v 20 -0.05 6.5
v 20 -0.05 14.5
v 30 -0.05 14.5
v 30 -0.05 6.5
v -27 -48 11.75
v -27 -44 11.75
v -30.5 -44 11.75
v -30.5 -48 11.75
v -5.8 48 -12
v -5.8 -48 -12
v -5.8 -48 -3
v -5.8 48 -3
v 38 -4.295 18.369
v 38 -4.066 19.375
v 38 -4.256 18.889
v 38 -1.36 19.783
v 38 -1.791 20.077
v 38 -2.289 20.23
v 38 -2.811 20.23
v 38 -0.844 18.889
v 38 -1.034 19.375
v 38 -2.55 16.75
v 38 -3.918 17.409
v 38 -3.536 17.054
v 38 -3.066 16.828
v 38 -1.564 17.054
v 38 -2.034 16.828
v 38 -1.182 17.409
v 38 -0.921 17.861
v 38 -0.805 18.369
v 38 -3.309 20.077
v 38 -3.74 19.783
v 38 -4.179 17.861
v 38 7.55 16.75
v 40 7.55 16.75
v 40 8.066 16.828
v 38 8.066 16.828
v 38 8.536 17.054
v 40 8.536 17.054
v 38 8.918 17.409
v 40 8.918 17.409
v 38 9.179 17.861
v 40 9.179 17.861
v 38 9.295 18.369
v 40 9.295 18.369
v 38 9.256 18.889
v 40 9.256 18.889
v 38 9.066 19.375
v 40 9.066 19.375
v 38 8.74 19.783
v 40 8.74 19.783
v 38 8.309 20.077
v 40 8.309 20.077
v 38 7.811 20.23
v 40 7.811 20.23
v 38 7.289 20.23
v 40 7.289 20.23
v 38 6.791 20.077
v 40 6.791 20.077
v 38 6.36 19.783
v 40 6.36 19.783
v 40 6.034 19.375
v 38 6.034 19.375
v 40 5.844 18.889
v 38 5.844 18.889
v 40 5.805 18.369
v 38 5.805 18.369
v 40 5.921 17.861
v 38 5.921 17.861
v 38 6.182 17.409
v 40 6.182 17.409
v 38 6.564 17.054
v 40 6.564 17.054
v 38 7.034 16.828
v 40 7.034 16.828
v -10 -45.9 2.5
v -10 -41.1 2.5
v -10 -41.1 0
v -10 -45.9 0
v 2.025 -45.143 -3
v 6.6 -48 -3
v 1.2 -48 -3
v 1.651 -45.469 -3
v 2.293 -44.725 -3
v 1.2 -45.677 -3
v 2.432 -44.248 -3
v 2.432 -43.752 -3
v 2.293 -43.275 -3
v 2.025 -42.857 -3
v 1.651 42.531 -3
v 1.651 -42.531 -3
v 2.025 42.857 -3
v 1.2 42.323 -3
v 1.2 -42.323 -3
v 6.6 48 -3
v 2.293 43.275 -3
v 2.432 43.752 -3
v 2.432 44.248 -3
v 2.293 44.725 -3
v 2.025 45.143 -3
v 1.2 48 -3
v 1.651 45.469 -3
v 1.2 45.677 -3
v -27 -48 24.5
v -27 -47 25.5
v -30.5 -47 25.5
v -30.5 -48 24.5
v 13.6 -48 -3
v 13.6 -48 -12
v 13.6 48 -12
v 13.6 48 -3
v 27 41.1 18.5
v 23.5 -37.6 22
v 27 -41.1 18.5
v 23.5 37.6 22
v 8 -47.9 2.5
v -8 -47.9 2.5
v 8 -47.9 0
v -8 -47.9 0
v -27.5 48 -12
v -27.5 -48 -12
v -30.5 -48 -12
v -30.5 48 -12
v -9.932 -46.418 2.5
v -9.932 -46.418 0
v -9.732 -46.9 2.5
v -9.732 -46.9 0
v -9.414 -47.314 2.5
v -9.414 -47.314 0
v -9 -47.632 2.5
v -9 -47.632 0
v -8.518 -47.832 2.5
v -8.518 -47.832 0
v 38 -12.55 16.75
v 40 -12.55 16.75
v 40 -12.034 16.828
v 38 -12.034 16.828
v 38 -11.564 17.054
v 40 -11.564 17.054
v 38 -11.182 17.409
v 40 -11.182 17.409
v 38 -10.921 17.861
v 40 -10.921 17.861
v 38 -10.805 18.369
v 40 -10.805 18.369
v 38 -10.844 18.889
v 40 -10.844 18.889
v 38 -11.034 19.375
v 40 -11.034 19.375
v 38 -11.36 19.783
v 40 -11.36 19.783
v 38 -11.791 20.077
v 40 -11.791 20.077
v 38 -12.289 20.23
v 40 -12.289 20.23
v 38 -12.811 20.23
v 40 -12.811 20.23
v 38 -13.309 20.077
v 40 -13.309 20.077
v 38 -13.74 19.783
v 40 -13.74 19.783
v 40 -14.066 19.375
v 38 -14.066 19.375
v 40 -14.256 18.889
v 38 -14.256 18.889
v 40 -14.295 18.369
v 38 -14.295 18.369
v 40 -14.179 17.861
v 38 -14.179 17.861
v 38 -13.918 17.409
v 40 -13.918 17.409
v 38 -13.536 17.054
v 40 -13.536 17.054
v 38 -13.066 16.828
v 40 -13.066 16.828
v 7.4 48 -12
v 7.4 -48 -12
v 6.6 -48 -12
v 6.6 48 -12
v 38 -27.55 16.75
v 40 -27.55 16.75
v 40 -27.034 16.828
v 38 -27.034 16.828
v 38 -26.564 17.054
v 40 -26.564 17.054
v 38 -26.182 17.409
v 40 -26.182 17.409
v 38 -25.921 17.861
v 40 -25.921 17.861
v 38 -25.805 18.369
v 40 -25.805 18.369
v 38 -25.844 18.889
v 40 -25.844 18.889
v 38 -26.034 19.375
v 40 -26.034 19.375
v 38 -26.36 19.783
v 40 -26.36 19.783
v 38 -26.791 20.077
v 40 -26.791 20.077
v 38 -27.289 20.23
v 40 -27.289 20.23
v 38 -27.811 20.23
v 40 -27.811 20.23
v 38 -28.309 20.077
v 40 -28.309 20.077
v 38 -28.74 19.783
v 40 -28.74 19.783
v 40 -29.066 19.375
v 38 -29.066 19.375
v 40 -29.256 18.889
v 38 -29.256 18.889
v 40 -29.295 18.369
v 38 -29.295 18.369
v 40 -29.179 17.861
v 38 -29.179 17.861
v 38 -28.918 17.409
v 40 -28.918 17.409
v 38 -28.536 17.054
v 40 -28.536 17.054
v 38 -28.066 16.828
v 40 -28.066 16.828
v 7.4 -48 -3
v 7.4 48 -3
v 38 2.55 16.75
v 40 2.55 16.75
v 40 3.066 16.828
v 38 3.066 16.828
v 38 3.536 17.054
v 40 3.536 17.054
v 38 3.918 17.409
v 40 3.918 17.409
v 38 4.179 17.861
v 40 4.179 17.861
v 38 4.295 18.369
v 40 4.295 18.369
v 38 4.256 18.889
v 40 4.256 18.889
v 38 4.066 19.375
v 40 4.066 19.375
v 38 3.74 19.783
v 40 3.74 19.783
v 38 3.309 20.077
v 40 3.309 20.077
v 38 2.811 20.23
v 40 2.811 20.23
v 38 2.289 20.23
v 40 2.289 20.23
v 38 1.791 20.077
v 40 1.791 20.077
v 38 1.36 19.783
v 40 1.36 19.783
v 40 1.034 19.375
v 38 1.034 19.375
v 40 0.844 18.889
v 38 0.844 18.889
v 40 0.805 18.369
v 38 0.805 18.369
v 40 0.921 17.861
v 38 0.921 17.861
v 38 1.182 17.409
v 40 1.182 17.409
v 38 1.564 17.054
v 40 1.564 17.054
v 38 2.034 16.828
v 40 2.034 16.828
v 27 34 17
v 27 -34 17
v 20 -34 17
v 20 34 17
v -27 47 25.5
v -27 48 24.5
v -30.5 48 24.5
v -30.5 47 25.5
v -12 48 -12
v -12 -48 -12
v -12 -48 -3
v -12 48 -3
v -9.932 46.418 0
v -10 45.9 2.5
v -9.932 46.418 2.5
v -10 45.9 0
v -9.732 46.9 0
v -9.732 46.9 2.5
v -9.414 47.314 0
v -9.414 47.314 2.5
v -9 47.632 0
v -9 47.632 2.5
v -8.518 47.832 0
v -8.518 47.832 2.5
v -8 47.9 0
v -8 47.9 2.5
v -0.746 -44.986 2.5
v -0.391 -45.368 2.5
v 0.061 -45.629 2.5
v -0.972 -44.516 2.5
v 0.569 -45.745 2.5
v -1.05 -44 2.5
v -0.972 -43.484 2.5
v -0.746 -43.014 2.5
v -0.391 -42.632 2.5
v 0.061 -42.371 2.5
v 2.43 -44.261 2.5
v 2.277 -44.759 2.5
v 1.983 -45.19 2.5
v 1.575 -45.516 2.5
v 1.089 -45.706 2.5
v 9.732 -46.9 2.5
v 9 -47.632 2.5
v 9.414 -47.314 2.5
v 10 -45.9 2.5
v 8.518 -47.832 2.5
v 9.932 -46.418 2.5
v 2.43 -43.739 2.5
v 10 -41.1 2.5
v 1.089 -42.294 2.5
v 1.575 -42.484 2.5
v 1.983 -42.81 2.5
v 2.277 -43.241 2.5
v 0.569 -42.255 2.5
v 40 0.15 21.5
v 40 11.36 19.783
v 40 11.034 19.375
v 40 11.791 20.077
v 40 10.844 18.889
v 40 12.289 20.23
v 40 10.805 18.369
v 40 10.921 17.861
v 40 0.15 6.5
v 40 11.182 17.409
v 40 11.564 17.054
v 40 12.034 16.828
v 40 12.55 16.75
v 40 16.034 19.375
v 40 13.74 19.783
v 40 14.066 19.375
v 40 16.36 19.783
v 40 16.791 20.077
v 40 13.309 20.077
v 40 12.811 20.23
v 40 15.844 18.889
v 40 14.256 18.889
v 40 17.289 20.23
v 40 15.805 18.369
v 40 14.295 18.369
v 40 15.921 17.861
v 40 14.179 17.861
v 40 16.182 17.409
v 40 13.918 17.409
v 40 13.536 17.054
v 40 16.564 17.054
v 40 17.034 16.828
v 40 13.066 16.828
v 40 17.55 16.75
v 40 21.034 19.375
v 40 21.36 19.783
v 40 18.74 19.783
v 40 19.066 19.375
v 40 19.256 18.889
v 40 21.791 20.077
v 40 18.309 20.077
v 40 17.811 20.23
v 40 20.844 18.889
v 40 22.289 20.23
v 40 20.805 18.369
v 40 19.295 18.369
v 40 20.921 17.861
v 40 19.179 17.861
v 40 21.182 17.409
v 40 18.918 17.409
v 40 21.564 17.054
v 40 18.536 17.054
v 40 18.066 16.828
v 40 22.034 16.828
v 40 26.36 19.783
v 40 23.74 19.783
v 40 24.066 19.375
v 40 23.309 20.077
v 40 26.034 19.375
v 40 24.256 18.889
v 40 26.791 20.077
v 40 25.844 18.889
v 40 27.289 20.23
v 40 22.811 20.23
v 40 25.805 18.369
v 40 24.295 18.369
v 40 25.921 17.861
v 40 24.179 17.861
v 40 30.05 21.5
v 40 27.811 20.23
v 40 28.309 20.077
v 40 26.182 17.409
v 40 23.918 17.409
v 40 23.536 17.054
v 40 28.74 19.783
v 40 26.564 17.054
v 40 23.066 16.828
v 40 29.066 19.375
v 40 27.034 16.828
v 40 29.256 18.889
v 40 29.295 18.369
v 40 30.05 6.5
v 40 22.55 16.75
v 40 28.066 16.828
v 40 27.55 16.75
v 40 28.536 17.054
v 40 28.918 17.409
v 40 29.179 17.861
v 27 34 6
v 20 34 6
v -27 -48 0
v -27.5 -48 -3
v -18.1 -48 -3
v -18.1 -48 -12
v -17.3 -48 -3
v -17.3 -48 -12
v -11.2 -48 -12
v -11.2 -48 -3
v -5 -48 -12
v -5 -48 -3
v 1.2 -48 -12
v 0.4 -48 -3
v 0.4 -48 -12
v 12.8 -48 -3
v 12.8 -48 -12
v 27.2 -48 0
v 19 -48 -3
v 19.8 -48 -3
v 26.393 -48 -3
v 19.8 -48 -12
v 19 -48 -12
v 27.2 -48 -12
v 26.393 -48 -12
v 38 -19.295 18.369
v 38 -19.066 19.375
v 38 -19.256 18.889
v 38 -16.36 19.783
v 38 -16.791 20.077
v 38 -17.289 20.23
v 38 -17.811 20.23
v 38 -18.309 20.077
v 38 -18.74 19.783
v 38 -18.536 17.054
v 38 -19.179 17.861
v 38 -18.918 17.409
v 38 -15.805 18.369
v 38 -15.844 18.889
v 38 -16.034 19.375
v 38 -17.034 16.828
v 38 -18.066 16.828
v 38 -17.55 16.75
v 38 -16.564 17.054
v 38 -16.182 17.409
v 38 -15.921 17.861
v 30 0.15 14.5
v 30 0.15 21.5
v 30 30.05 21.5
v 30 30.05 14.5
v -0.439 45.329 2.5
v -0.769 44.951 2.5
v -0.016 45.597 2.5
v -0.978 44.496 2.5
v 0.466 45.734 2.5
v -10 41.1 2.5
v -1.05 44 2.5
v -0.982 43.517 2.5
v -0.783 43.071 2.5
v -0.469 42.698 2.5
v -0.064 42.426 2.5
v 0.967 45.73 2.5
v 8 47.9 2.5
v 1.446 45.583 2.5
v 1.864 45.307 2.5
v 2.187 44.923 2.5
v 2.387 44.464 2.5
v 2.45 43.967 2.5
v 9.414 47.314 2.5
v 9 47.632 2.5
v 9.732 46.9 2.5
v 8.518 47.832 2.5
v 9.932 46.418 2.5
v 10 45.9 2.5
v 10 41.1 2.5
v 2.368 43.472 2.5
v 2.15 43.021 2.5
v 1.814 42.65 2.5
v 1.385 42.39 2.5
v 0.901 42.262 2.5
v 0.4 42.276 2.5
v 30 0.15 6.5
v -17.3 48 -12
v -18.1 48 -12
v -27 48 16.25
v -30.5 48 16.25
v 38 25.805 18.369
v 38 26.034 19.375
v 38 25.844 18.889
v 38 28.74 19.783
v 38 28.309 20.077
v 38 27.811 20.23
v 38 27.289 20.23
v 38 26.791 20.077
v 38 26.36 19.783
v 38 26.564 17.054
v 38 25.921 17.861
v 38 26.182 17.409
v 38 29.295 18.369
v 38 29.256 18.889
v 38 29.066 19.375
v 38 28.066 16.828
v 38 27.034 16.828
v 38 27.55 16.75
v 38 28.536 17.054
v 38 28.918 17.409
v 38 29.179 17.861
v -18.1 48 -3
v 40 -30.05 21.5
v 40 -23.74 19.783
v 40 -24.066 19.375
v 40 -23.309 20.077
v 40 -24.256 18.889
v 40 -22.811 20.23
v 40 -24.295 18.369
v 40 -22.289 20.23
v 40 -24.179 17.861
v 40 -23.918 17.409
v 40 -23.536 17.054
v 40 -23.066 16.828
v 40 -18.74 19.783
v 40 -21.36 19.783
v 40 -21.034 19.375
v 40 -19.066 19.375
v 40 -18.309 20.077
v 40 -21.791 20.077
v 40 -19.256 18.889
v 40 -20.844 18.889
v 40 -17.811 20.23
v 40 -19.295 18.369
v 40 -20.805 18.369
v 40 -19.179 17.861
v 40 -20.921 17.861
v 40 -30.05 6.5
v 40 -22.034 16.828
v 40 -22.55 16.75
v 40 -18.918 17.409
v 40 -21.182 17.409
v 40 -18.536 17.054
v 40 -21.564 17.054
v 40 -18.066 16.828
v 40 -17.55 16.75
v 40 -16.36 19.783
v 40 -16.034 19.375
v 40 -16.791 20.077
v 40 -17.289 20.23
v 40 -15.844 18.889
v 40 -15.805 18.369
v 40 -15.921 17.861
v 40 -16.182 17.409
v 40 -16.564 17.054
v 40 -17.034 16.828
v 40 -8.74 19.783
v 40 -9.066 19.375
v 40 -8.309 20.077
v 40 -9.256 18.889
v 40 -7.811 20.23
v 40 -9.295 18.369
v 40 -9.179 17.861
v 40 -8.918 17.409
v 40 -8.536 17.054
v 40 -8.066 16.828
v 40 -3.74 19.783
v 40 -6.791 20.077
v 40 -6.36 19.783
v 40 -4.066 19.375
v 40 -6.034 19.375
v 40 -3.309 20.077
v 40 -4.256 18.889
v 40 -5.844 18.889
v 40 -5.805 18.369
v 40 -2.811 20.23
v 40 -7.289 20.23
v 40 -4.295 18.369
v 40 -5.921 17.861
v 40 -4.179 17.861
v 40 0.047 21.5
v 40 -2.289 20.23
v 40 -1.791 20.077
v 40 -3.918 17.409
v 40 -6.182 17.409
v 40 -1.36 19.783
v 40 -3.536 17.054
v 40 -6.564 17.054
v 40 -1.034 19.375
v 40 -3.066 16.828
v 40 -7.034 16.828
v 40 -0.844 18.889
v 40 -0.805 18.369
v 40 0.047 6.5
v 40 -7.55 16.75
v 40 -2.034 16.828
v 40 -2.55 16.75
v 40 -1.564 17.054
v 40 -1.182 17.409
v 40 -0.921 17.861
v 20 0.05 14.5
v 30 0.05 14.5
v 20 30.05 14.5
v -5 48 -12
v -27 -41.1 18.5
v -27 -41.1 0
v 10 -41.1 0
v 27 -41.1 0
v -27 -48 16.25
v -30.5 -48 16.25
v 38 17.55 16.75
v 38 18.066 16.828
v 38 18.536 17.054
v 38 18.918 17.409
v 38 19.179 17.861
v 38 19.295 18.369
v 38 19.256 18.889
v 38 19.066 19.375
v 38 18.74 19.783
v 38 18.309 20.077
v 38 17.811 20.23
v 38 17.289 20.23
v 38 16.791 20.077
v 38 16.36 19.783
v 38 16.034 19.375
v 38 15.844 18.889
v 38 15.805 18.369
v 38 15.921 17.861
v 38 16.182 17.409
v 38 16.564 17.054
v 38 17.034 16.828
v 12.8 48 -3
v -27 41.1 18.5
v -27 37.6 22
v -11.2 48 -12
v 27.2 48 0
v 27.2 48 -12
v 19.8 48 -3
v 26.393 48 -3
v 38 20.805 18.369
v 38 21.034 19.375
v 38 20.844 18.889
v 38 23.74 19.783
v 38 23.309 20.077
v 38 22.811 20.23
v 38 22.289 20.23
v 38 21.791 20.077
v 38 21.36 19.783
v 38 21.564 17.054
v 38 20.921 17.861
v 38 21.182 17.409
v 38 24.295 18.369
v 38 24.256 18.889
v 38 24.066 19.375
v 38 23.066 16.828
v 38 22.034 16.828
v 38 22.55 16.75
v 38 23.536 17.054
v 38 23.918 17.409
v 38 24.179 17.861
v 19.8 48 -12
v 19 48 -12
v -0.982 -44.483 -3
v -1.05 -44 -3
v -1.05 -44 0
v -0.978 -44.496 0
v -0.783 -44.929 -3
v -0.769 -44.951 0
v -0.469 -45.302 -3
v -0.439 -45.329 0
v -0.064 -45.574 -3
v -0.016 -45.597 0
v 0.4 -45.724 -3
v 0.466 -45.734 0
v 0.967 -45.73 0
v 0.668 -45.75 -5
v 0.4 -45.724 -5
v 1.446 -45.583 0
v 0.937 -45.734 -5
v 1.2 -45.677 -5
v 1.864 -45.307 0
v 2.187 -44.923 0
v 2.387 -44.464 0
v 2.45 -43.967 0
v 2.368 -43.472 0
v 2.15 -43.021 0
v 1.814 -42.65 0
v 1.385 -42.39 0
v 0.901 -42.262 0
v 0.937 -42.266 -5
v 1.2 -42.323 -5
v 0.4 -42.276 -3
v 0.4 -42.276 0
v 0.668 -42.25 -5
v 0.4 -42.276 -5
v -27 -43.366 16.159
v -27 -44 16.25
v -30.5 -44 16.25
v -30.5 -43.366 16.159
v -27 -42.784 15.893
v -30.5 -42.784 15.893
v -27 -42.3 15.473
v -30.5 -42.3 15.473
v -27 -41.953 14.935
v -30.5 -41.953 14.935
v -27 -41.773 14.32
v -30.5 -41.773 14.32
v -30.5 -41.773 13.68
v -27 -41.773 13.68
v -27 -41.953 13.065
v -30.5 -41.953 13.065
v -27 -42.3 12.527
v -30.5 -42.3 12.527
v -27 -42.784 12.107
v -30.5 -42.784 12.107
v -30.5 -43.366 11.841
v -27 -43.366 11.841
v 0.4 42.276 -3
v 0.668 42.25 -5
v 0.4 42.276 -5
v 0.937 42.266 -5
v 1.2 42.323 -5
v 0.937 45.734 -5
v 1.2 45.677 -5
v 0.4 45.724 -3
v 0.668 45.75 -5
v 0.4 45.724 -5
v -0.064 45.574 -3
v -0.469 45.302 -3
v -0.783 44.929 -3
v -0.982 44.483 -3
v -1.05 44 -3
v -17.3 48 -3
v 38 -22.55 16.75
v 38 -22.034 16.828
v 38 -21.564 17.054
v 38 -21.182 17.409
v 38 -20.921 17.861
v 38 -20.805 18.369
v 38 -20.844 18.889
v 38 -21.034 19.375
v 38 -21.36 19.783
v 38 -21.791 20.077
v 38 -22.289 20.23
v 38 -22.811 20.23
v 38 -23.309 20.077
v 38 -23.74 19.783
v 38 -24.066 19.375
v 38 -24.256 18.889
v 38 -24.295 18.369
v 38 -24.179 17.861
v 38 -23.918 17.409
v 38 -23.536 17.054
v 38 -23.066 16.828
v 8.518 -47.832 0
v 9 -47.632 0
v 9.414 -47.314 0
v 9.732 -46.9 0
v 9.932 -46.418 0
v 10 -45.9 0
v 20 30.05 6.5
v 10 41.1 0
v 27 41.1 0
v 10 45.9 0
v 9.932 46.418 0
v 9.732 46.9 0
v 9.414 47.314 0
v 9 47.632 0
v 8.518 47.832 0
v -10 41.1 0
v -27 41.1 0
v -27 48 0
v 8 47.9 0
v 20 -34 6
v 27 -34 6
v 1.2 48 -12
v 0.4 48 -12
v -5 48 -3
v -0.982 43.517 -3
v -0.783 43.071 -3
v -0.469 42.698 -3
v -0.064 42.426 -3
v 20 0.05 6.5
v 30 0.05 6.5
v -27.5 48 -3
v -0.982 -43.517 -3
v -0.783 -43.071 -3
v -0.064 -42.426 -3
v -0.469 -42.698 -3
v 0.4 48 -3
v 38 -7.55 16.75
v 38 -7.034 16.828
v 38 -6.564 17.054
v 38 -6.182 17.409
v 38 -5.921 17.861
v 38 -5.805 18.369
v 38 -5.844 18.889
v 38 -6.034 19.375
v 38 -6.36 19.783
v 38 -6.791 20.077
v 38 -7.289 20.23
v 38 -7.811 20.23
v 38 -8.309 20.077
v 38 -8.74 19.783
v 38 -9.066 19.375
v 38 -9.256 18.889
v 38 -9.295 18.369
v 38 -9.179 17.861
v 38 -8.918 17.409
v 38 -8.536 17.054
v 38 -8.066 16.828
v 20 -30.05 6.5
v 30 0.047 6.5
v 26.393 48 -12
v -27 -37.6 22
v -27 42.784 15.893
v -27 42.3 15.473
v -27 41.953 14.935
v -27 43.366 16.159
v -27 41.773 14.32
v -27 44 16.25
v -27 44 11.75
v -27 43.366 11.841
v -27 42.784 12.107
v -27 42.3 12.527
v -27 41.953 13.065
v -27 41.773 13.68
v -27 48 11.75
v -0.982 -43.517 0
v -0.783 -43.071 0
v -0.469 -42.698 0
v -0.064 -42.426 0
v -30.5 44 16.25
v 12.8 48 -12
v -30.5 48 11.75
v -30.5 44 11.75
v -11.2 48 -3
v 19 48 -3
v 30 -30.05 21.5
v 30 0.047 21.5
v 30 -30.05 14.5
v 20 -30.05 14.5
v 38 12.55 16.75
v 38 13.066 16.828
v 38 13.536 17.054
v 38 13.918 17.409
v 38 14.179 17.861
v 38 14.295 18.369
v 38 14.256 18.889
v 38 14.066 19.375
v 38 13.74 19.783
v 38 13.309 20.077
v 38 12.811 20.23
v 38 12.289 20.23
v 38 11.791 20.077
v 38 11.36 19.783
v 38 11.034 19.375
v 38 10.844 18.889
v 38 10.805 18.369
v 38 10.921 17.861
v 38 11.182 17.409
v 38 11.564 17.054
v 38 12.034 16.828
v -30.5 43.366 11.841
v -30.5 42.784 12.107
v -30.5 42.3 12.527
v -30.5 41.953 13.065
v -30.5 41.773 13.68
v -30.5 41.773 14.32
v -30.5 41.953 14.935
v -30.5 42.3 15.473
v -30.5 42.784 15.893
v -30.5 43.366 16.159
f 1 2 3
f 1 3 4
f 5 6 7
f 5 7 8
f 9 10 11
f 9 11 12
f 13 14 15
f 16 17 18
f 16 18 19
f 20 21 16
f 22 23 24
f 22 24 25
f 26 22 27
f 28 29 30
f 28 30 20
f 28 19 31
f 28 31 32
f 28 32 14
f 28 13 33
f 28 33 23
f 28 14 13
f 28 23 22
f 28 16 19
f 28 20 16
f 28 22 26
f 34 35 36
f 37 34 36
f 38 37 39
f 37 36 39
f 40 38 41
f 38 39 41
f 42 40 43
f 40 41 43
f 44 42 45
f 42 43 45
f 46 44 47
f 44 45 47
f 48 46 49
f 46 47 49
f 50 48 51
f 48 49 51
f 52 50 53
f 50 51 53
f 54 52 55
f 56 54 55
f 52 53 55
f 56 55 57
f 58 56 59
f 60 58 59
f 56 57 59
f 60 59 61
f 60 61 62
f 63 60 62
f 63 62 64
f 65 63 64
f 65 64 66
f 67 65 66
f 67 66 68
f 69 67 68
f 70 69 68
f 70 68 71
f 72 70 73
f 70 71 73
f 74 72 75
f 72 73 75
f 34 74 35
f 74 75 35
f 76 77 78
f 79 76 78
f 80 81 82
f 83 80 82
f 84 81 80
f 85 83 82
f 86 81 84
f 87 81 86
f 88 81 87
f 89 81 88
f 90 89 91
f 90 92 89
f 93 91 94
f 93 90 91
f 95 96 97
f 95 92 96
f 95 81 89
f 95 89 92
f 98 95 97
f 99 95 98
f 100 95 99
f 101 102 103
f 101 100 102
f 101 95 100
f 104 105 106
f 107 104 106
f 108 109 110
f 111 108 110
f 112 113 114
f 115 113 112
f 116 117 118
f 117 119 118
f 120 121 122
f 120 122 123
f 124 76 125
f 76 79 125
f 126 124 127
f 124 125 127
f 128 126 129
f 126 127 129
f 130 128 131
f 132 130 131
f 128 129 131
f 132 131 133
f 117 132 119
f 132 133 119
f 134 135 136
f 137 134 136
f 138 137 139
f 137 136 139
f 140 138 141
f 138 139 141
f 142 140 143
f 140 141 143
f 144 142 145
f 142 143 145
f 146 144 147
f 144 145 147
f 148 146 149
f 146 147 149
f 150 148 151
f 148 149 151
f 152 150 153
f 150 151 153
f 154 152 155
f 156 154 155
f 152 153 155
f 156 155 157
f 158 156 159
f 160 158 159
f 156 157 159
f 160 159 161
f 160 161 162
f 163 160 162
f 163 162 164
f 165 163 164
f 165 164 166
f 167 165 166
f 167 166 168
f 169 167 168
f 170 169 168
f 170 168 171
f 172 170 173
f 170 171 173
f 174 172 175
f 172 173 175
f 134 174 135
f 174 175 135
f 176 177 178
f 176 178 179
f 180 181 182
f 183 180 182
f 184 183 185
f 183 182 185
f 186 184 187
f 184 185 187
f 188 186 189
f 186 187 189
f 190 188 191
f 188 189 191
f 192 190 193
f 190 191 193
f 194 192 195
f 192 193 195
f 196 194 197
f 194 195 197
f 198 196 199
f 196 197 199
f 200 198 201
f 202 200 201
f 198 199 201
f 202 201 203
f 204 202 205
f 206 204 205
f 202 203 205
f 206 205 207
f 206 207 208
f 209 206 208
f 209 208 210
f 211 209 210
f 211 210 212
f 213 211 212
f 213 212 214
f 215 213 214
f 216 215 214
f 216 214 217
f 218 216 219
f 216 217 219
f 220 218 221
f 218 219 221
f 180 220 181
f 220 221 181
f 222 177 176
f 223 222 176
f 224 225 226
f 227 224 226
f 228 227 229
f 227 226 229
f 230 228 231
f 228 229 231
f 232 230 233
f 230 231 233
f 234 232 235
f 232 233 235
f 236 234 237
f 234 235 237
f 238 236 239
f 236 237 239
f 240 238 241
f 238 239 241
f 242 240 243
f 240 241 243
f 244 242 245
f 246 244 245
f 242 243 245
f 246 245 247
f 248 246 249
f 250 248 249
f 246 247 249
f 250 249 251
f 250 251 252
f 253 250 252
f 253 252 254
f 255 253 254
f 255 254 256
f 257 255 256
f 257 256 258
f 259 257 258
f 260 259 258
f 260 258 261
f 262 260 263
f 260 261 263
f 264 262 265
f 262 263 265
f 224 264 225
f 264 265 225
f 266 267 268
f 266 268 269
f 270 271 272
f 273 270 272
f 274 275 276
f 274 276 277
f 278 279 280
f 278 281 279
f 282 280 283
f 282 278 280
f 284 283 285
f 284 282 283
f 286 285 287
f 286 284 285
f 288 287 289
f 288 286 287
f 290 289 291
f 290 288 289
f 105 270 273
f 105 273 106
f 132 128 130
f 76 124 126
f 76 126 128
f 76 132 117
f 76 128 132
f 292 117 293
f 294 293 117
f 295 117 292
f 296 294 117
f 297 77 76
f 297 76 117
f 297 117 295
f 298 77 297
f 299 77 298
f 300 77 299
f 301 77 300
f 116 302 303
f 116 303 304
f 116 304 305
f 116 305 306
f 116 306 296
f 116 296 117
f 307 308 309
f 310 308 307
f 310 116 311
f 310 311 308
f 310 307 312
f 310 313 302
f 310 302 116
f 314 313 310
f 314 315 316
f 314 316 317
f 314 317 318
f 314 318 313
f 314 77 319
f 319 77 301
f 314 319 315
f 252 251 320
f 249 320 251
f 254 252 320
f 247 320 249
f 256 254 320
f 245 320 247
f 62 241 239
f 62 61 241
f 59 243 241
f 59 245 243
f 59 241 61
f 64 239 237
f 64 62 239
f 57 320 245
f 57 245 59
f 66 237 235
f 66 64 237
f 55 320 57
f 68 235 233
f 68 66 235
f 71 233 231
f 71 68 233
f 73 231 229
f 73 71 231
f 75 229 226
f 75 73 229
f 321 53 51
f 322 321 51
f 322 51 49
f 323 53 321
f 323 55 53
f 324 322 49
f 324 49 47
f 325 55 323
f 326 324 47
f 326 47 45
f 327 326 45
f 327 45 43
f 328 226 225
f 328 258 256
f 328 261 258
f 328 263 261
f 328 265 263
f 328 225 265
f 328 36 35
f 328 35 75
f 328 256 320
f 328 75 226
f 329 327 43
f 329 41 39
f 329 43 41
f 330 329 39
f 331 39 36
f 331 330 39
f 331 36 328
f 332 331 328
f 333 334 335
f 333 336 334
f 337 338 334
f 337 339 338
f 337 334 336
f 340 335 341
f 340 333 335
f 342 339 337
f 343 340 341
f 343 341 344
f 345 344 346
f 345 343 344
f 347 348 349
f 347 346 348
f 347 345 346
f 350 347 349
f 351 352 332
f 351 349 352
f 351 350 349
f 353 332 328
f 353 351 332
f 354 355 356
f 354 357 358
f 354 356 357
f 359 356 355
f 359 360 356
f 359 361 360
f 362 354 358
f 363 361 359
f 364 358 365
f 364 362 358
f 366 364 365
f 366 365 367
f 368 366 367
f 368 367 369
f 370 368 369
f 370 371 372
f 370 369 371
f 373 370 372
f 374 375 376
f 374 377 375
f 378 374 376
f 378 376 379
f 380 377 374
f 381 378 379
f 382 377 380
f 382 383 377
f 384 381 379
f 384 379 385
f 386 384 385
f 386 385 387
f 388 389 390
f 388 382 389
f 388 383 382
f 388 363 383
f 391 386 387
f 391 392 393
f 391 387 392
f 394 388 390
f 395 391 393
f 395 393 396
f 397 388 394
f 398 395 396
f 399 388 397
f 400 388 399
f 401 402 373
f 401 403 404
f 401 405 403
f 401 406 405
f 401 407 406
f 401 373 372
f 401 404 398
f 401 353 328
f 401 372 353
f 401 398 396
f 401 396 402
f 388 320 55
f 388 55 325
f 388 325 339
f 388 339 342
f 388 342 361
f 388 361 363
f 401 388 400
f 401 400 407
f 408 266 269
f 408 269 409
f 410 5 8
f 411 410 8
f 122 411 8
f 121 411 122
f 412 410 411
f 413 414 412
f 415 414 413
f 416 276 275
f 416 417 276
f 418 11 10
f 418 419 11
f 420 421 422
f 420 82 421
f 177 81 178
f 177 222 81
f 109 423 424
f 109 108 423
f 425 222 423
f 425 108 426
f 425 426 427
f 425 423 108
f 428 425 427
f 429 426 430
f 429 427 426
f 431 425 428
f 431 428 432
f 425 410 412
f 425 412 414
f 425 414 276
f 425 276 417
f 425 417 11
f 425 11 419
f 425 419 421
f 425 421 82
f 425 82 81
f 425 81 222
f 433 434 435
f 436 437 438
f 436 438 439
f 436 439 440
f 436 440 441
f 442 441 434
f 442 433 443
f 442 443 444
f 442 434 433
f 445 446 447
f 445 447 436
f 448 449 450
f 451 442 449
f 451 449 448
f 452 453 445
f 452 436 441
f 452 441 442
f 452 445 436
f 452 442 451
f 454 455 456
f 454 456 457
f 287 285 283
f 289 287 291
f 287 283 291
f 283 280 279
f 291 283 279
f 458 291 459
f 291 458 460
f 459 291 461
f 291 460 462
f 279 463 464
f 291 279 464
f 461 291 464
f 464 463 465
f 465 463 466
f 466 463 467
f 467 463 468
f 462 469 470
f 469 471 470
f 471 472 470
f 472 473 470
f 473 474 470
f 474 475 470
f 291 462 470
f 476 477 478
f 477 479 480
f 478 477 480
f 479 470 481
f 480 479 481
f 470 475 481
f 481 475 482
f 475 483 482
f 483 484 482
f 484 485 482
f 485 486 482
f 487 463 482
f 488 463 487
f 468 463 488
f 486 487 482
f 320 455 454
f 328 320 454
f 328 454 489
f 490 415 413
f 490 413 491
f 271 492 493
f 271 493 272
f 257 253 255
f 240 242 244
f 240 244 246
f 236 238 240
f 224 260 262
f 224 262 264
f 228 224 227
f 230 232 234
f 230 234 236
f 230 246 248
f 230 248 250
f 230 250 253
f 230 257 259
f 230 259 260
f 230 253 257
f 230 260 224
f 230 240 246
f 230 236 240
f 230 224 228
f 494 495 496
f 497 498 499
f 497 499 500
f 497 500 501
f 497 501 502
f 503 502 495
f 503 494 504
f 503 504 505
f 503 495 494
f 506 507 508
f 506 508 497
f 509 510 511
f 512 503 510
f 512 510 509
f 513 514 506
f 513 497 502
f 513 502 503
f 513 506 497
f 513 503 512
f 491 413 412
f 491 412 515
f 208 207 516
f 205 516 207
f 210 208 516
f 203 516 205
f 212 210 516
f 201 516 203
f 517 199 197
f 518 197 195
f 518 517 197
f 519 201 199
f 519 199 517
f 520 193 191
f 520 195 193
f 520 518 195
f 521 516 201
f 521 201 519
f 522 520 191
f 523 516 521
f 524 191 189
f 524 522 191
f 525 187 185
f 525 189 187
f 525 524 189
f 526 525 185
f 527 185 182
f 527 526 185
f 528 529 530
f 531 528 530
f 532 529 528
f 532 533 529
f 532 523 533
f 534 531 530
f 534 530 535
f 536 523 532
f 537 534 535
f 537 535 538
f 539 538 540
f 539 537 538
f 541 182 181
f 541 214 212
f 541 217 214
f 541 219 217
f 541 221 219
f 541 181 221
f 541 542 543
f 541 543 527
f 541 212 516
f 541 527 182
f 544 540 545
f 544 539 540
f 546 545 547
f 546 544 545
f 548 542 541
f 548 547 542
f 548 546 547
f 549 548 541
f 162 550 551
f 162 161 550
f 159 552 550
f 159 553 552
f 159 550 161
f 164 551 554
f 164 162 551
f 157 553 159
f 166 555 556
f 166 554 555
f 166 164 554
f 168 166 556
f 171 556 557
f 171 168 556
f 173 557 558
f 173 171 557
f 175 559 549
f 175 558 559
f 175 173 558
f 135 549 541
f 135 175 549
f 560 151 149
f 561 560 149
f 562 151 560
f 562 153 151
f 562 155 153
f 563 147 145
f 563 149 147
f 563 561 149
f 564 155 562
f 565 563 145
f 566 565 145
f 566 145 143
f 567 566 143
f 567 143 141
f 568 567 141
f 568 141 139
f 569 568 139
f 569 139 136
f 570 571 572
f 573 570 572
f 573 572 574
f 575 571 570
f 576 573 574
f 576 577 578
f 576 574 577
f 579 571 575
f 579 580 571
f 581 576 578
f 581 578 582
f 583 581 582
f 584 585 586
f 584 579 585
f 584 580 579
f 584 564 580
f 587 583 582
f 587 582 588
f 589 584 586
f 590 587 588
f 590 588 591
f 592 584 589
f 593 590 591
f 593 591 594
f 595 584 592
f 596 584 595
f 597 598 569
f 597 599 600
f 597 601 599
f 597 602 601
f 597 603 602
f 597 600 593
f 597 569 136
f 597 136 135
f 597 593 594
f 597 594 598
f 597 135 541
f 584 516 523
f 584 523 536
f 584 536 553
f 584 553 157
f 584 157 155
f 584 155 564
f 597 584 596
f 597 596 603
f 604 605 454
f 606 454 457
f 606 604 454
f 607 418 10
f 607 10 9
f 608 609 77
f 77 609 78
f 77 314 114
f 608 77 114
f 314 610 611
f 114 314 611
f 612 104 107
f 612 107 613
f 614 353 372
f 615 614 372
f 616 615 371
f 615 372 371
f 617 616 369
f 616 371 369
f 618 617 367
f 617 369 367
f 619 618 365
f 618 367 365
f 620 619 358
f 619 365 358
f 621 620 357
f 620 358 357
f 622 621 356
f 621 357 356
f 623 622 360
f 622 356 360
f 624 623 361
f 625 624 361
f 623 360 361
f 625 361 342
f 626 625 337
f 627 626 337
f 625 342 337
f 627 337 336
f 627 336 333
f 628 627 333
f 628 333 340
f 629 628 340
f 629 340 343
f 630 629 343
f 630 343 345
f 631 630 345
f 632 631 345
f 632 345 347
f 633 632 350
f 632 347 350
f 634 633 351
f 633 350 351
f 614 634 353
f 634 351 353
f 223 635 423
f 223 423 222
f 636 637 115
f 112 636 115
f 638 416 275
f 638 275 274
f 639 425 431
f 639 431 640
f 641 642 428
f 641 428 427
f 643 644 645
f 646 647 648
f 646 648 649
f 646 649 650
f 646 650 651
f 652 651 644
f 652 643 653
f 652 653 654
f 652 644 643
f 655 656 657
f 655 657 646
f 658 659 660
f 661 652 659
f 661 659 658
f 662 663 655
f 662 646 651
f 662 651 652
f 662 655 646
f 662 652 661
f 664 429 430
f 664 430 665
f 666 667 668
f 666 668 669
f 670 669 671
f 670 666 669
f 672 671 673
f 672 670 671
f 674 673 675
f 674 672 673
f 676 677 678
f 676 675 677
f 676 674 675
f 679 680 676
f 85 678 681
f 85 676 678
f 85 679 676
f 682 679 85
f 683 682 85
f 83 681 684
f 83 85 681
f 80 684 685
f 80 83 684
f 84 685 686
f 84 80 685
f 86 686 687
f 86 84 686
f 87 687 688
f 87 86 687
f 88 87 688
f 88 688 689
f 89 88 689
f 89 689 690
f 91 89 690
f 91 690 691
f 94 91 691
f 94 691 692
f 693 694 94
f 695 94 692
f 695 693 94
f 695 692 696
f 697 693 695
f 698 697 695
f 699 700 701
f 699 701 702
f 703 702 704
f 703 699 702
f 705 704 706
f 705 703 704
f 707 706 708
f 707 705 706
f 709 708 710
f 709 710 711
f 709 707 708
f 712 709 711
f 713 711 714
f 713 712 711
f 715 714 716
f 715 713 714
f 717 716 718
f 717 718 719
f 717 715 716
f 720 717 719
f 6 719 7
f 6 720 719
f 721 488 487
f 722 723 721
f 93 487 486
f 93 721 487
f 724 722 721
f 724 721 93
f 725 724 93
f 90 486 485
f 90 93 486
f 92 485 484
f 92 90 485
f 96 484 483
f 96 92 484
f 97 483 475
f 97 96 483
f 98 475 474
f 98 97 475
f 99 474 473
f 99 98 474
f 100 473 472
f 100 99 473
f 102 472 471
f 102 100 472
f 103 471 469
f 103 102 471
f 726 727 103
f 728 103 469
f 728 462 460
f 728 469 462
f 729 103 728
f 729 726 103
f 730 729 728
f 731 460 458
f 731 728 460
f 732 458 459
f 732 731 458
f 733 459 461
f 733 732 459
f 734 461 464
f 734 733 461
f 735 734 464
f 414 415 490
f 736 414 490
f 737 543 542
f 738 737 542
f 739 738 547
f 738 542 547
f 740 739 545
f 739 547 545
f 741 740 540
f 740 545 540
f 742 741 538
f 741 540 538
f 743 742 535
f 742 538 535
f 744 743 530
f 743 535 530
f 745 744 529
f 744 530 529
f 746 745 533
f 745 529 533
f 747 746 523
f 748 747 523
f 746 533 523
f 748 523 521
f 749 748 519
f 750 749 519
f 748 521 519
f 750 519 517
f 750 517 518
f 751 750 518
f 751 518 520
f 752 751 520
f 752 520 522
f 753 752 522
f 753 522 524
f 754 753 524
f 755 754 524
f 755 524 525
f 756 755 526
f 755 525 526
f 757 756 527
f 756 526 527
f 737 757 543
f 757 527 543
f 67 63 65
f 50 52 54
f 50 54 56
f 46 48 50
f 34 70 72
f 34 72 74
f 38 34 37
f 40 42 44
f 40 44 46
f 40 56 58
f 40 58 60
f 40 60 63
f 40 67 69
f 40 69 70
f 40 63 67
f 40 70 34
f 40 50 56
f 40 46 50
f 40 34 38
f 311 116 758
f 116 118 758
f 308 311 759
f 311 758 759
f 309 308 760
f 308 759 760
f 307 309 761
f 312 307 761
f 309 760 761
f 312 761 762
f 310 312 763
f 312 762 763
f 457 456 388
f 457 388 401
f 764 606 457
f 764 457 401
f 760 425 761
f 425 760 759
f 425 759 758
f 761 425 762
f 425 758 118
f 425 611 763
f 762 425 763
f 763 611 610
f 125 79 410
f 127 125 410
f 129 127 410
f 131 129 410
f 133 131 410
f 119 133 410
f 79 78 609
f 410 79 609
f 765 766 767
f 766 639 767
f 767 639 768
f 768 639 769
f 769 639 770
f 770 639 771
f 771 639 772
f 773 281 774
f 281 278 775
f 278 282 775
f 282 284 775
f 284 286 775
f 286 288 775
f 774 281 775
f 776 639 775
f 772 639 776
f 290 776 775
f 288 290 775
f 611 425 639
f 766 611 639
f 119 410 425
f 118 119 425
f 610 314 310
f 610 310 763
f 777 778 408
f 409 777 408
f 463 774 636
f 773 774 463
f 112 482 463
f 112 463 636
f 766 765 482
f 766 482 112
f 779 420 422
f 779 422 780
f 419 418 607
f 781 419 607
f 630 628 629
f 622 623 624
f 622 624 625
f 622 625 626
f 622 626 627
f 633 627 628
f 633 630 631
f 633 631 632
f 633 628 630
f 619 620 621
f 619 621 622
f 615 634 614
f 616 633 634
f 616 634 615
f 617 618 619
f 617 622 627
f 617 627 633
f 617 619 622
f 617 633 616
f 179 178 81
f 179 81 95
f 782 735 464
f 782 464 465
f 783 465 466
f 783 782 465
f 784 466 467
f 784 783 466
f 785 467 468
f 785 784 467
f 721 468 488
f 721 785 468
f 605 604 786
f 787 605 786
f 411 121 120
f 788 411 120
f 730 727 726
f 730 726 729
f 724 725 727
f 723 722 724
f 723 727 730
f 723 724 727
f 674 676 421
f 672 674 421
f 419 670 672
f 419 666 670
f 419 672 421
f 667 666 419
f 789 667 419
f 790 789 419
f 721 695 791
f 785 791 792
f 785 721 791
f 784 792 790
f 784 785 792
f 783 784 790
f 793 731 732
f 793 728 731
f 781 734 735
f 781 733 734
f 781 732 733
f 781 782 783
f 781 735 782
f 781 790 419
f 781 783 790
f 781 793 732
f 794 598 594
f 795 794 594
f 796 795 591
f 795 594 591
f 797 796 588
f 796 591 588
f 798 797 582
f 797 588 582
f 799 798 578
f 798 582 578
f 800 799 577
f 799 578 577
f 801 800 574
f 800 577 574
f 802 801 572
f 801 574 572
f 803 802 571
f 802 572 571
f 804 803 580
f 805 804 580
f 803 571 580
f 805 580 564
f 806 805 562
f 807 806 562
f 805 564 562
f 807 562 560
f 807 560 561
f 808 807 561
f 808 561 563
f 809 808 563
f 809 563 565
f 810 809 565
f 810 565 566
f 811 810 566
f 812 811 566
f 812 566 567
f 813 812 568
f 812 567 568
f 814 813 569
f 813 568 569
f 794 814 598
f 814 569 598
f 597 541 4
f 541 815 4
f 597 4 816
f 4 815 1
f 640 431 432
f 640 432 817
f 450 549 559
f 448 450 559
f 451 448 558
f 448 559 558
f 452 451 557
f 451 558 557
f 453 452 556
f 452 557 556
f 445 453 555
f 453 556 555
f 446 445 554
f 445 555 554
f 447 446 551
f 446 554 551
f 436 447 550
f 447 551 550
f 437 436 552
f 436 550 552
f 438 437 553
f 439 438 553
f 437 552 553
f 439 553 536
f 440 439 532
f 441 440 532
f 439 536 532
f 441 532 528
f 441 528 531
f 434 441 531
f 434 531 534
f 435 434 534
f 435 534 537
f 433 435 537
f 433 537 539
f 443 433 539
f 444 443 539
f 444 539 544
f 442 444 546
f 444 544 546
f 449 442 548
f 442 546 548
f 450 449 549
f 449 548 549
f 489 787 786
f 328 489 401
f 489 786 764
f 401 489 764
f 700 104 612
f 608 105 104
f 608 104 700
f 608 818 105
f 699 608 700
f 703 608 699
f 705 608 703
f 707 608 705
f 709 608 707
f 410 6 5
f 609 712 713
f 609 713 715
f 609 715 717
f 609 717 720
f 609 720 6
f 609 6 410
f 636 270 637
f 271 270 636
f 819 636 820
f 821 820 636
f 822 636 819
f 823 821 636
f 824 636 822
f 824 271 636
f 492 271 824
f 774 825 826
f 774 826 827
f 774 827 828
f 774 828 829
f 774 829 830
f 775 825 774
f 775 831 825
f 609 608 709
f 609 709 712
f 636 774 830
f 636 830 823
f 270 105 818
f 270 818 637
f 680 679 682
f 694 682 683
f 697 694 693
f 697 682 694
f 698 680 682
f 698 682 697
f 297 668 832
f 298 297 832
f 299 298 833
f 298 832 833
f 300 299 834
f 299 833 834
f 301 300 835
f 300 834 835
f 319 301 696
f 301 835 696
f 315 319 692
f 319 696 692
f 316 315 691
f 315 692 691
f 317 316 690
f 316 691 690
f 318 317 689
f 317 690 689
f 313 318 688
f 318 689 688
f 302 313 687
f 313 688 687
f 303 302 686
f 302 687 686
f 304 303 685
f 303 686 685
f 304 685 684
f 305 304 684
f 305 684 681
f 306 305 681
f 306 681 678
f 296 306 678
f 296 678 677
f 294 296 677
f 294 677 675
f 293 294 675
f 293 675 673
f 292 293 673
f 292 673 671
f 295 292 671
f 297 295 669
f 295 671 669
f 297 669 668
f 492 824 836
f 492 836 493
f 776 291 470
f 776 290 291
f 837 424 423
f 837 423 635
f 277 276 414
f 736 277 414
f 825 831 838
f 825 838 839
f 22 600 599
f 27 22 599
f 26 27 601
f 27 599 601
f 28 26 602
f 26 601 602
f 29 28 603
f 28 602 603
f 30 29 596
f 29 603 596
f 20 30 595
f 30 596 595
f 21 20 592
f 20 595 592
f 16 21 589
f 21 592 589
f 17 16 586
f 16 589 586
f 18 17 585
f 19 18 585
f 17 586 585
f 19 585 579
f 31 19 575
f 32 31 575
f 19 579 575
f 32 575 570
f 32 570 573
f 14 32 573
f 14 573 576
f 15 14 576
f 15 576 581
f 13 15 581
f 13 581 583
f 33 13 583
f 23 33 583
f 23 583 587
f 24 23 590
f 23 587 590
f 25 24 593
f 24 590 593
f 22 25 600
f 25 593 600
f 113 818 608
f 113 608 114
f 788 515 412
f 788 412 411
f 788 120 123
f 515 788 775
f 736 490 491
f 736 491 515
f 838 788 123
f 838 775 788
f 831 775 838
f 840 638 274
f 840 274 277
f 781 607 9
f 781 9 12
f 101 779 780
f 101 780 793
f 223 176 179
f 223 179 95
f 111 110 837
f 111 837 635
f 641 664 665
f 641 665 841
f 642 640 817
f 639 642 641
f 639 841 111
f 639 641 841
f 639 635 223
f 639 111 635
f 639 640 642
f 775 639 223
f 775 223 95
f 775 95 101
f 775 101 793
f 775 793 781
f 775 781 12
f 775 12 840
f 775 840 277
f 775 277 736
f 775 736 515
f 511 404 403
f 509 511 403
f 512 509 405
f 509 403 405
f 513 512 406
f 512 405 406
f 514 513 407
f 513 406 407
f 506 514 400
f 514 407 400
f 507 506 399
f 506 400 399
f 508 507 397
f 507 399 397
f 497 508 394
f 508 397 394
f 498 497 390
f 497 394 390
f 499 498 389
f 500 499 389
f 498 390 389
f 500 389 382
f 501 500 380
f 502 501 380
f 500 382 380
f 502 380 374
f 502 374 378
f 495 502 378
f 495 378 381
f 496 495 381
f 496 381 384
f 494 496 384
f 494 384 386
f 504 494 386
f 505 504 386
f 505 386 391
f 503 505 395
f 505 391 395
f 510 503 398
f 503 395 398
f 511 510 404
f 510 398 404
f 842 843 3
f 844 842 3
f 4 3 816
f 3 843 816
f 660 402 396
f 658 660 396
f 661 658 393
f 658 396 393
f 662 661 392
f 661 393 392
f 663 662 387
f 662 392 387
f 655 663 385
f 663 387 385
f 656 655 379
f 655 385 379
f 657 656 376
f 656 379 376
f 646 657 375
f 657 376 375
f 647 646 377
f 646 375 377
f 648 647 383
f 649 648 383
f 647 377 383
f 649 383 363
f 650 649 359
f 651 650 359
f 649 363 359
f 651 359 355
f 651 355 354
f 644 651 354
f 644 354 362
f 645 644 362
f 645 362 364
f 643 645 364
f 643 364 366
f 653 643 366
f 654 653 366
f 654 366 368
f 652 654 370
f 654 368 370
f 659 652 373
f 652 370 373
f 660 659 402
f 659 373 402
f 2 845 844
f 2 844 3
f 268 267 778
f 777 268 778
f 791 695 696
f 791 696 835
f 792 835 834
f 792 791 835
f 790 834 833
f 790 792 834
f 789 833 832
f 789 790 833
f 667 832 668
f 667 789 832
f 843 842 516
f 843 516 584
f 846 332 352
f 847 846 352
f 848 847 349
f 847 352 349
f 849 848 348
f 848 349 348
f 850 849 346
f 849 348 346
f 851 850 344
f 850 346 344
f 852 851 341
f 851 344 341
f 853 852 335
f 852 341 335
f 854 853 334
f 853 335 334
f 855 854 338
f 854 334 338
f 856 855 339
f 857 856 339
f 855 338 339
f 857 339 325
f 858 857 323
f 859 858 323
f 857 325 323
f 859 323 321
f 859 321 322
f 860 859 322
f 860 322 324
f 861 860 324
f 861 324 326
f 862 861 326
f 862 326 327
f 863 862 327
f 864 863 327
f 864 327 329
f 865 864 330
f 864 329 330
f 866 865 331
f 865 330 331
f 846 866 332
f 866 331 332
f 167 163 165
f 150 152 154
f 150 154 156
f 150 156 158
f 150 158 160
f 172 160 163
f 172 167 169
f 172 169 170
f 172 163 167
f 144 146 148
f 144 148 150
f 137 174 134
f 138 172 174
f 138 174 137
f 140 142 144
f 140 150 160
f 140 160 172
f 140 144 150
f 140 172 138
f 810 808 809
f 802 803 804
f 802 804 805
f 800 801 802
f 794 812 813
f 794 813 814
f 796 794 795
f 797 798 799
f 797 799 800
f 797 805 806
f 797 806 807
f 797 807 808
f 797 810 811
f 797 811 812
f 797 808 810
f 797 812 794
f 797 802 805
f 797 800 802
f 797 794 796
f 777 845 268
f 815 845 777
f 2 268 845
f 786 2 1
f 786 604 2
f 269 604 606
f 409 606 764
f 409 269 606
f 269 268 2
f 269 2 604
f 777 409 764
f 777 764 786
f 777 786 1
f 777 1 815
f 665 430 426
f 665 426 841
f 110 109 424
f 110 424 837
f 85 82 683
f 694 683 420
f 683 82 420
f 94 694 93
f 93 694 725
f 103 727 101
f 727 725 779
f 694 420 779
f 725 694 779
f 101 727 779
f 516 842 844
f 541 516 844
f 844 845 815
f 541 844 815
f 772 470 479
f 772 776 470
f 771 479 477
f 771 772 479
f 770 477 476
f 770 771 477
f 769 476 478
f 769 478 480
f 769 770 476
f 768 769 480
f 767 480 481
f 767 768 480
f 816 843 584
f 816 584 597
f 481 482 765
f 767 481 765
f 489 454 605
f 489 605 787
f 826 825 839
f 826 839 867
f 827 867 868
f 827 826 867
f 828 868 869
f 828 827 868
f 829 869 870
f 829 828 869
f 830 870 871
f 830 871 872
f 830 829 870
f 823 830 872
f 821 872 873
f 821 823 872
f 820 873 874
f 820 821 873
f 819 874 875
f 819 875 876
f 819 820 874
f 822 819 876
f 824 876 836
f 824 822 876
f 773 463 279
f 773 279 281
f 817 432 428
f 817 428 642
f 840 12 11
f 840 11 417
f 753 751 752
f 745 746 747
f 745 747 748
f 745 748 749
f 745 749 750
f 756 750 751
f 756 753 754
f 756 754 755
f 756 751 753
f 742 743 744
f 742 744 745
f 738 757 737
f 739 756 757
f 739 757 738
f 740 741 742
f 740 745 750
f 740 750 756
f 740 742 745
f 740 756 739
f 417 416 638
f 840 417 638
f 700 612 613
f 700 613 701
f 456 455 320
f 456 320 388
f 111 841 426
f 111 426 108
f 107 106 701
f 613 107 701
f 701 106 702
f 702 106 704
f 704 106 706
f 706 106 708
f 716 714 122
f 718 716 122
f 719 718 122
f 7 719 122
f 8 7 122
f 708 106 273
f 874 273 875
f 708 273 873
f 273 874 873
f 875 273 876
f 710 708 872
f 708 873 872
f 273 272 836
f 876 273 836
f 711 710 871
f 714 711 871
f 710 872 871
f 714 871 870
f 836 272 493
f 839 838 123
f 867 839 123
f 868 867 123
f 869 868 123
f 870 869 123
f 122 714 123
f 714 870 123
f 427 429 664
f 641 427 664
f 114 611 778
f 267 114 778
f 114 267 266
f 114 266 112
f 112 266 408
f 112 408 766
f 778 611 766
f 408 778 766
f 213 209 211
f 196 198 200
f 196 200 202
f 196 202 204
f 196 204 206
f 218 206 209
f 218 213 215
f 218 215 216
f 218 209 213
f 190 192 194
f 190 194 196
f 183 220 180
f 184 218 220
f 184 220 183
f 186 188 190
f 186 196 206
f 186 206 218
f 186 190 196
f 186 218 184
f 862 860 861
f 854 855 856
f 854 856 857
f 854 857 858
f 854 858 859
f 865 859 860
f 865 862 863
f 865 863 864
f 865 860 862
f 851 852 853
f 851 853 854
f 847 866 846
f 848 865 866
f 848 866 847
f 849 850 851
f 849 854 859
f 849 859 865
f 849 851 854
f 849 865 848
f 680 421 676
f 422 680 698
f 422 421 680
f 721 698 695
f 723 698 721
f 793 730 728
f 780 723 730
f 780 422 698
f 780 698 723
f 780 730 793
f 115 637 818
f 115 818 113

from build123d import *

# Parameters (mm, degrees)
SKETCH_1_W             = 54
SKETCH_1_H             = 82.2
EXTRUDE_1_DEPTH        = 22
CHAMFER_1_SIZE         = 3.5
SKETCH_2_W             = 54.2
SKETCH_2_H             = 96
EXTRUDE_2_DEPTH        = 12
EXTRUDE_3_DEPTH        = 3.5
CHAMFER_2_SIZE         = 1
SKETCH_5_W             = 9.4
SKETCH_5_H             = 96
SKETCH_5_W_2           = 5.3
SKETCH_5_W_3           = 5.4
SKETCH_5_W_4           = 6.593289258
CUT_EXTRUDE_2_DEPTH    = 9
SKETCH_6_W             = 11
SKETCH_6_H             = 68
CUT_EXTRUDE_3_DEPTH    = 7
SKETCH_7_W             = 8
SKETCH_7_H             = 30
EXTRUDE_5_DEPTH        = 10
SKETCH_8_W             = 15
SKETCH_8_H             = 30.09688029
SKETCH_8_H_2           = 29.900272582
EXTRUDE_6_DEPTH        = 10
SKETCH_9_R             = 1.75
CUT_EXTRUDE_4_DEPTH    = 2
SKETCH_10_W            = 20
SKETCH_10_H            = 2.5
EXTRUDE_7_DEPTH        = 6.8
CUT_EXTRUDE_START      = -5
SKETCH_4_R             = 1.75
CUT_EXTRUDE_1_DEPTH    = 75.485183559
FILLET_1_R             = 2
FILLET_1_OF_MIRROR_1_R = 2


with BuildPart() as part:
    # Эскиз1 → Бобышка-Вытянуть1 (new body)
    with BuildSketch(Plane.XY):
        Rectangle(SKETCH_1_W, SKETCH_1_H)
    extrude(amount=EXTRUDE_1_DEPTH)

    # Фаска1
    chamfer_1_edges = [part.edges().sort_by_distance(p)[0] for p in [
        (0, -41.1, 22),
        (27, 0, 22),
        (0, 41.1, 22),
    ]]
    chamfer(chamfer_1_edges, length=CHAMFER_1_SIZE)

    # Эскиз2 → Бобышка-Вытянуть2 (add)
    with BuildSketch(Plane(origin=(0, 0, 0), x_dir=(-1, 0, 0), z_dir=(0, 0, -1))):
        with Locations((-0.1, 0)):
            Rectangle(SKETCH_2_W, SKETCH_2_H)
    extrude(amount=EXTRUDE_2_DEPTH)

    # Эскиз3 → Бобышка-Вытянуть3 (add)
    with BuildSketch(Plane.ZY.offset(27)):
        with BuildLine():
            Line((-12, 48), (11.75, 48))
            Line((11.75, 48), (11.75, 44))
            ThreePointArc((11.75, 44), (14, 41.75), (16.25, 44))
            Line((16.25, 44), (16.25, 48))
            Line((16.25, 48), (25.5, 48))
            Line((25.5, 48), (25.5, -48))
            Line((25.5, -48), (16.25, -48))
            Line((16.25, -48), (16.25, -44))
            ThreePointArc((16.25, -44), (14, -41.75), (11.75, -44))
            Line((11.75, -44), (11.75, -48))
            Line((11.75, -48), (-12, -48))
            Line((-12, -48), (-12, 48))
        make_face()
    extrude(amount=EXTRUDE_3_DEPTH)

    # Фаска2
    chamfer_2_edges = [part.edges().sort_by_distance(p)[0] for p in [
        (-28.75, -48, 25.5),
        (-28.75, 48, 25.5),
    ]]
    chamfer(chamfer_2_edges, length=CHAMFER_2_SIZE)

    # Эскиз5 → Вырез-Вытянуть2 (cut)
    with BuildSketch(Plane(origin=(0, 0, -12), x_dir=(-1, 0, 0), z_dir=(0, 0, -1))):
        with Locations((22.8, 0)):
            Rectangle(SKETCH_5_W, SKETCH_5_H)
        with Locations((14.65, 0)):
            Rectangle(SKETCH_5_W_2, SKETCH_5_H)
        with Locations((8.5, 0)):
            Rectangle(SKETCH_5_W_3, SKETCH_5_H)
        with Locations((2.3, 0)):
            Rectangle(SKETCH_5_W_3, SKETCH_5_H)
        with Locations((-3.9, 0)):
            Rectangle(SKETCH_5_W_3, SKETCH_5_H)
        with Locations((-10.1, 0)):
            Rectangle(SKETCH_5_W_3, SKETCH_5_H)
        with Locations((-16.3, 0)):
            Rectangle(SKETCH_5_W_3, SKETCH_5_H)
        with Locations((-23.096644629, 0)):
            Rectangle(SKETCH_5_W_4, SKETCH_5_H)
    extrude(amount=-CUT_EXTRUDE_2_DEPTH, mode=Mode.SUBTRACT)

    # Эскиз6 → Вырез-Вытянуть3 (cut)
    with BuildSketch(Plane(origin=(27, 0, 0), x_dir=(0, 0, -1), z_dir=(1, 0, 0))):
        with Locations((-11.5, 0)):
            Rectangle(SKETCH_6_W, SKETCH_6_H)
    extrude(amount=-CUT_EXTRUDE_3_DEPTH, mode=Mode.SUBTRACT)

    # Эскиз7 → Бобышка-Вытянуть5 (add)
    with BuildSketch(Plane(origin=(20, 0, 0), x_dir=(0, 0, -1), z_dir=(1, 0, 0))):
        with Locations((-10.5, -15.05)):
            Rectangle(SKETCH_7_W, SKETCH_7_H)
        with Locations((-10.5, 15.05)):
            Rectangle(SKETCH_7_W, SKETCH_7_H)
    extrude(amount=EXTRUDE_5_DEPTH)

    # Эскиз8 → Бобышка-Вытянуть6 (add)
    with BuildSketch(Plane(origin=(30, 0, 0), x_dir=(0, 0, -1), z_dir=(1, 0, 0))):
        with Locations((-14, -15.001559855)):
            Rectangle(SKETCH_8_W, SKETCH_8_H)
        with Locations((-14, 15.099863709)):
            Rectangle(SKETCH_8_W, SKETCH_8_H_2)
    extrude(amount=EXTRUDE_6_DEPTH)

    # Эскиз9 → Вырез-Вытянуть4 (cut)
    with BuildSketch(Plane(origin=(40, 0, 0), x_dir=(0, 0, -1), z_dir=(1, 0, 0))):
        with Locations((-18.5, -27.55)):
            Circle(SKETCH_9_R)
        with Locations((-18.5, -22.55)):
            Circle(SKETCH_9_R)
        with Locations((-18.5, -17.55)):
            Circle(SKETCH_9_R)
        with Locations((-18.5, -12.55)):
            Circle(SKETCH_9_R)
        with Locations((-18.5, -7.55)):
            Circle(SKETCH_9_R)
        with Locations((-18.5, -2.55)):
            Circle(SKETCH_9_R)
        with Locations((-18.5, 2.55)):
            Circle(SKETCH_9_R)
        with Locations((-18.5, 7.55)):
            Circle(SKETCH_9_R)
        with Locations((-18.5, 12.55)):
            Circle(SKETCH_9_R)
        with Locations((-18.5, 17.55)):
            Circle(SKETCH_9_R)
        with Locations((-18.5, 22.55)):
            Circle(SKETCH_9_R)
        with Locations((-18.5, 27.55)):
            Circle(SKETCH_9_R)
    extrude(amount=-CUT_EXTRUDE_4_DEPTH, mode=Mode.SUBTRACT)

    # Эскиз10 → Бобышка-Вытянуть7 (add)
    with BuildSketch(Plane(origin=(0, 41.1, 0), x_dir=(1, 0, 0), z_dir=(0, 1, 0))):
        with Locations((0, -1.25)):
            Rectangle(SKETCH_10_W, SKETCH_10_H)
    extrude_7 = extrude(amount=EXTRUDE_7_DEPTH)

    # Эскиз4 → Вырез-Вытянуть1 (cut)
    with BuildSketch(Plane.XY.offset(CUT_EXTRUDE_START)):
        with Locations(Location((0.7, -44, 0), (0, 0, 99.870889606))):
            Circle(SKETCH_4_R)
        with Locations(Location((0.7, 44, 0), (0, 0, 180))):
            Circle(SKETCH_4_R)
    cut_extrude_1 = extrude(amount=CUT_EXTRUDE_1_DEPTH, mode=Mode.SUBTRACT)

    # Скругление1
    fillet_1_edges = [part.edges().sort_by_distance(p)[0] for p in [
        (10, 47.9, 1.25),
        (-10, 47.9, 1.25),
    ]]
    fillet(fillet_1_edges, radius=FILLET_1_R)

    # Зеркальное отражение1: Бобышка-Вытянуть7, Вырез-Вытянуть1 across plane
    add(extrude_7.mirror(Plane.ZX))
    add(cut_extrude_1.mirror(Plane.ZX), mode=Mode.SUBTRACT)

    # Скругление1 of Зеркальное отражение1
    fillet_1_of_mirror_1_edges = [part.edges().sort_by_distance(p)[0] for p in [
        (10, -47.9, 1.25),
        (-10, -47.9, 1.25),
    ]]
    fillet(fillet_1_of_mirror_1_edges, radius=FILLET_1_OF_MIRROR_1_R)


solid = part.part
